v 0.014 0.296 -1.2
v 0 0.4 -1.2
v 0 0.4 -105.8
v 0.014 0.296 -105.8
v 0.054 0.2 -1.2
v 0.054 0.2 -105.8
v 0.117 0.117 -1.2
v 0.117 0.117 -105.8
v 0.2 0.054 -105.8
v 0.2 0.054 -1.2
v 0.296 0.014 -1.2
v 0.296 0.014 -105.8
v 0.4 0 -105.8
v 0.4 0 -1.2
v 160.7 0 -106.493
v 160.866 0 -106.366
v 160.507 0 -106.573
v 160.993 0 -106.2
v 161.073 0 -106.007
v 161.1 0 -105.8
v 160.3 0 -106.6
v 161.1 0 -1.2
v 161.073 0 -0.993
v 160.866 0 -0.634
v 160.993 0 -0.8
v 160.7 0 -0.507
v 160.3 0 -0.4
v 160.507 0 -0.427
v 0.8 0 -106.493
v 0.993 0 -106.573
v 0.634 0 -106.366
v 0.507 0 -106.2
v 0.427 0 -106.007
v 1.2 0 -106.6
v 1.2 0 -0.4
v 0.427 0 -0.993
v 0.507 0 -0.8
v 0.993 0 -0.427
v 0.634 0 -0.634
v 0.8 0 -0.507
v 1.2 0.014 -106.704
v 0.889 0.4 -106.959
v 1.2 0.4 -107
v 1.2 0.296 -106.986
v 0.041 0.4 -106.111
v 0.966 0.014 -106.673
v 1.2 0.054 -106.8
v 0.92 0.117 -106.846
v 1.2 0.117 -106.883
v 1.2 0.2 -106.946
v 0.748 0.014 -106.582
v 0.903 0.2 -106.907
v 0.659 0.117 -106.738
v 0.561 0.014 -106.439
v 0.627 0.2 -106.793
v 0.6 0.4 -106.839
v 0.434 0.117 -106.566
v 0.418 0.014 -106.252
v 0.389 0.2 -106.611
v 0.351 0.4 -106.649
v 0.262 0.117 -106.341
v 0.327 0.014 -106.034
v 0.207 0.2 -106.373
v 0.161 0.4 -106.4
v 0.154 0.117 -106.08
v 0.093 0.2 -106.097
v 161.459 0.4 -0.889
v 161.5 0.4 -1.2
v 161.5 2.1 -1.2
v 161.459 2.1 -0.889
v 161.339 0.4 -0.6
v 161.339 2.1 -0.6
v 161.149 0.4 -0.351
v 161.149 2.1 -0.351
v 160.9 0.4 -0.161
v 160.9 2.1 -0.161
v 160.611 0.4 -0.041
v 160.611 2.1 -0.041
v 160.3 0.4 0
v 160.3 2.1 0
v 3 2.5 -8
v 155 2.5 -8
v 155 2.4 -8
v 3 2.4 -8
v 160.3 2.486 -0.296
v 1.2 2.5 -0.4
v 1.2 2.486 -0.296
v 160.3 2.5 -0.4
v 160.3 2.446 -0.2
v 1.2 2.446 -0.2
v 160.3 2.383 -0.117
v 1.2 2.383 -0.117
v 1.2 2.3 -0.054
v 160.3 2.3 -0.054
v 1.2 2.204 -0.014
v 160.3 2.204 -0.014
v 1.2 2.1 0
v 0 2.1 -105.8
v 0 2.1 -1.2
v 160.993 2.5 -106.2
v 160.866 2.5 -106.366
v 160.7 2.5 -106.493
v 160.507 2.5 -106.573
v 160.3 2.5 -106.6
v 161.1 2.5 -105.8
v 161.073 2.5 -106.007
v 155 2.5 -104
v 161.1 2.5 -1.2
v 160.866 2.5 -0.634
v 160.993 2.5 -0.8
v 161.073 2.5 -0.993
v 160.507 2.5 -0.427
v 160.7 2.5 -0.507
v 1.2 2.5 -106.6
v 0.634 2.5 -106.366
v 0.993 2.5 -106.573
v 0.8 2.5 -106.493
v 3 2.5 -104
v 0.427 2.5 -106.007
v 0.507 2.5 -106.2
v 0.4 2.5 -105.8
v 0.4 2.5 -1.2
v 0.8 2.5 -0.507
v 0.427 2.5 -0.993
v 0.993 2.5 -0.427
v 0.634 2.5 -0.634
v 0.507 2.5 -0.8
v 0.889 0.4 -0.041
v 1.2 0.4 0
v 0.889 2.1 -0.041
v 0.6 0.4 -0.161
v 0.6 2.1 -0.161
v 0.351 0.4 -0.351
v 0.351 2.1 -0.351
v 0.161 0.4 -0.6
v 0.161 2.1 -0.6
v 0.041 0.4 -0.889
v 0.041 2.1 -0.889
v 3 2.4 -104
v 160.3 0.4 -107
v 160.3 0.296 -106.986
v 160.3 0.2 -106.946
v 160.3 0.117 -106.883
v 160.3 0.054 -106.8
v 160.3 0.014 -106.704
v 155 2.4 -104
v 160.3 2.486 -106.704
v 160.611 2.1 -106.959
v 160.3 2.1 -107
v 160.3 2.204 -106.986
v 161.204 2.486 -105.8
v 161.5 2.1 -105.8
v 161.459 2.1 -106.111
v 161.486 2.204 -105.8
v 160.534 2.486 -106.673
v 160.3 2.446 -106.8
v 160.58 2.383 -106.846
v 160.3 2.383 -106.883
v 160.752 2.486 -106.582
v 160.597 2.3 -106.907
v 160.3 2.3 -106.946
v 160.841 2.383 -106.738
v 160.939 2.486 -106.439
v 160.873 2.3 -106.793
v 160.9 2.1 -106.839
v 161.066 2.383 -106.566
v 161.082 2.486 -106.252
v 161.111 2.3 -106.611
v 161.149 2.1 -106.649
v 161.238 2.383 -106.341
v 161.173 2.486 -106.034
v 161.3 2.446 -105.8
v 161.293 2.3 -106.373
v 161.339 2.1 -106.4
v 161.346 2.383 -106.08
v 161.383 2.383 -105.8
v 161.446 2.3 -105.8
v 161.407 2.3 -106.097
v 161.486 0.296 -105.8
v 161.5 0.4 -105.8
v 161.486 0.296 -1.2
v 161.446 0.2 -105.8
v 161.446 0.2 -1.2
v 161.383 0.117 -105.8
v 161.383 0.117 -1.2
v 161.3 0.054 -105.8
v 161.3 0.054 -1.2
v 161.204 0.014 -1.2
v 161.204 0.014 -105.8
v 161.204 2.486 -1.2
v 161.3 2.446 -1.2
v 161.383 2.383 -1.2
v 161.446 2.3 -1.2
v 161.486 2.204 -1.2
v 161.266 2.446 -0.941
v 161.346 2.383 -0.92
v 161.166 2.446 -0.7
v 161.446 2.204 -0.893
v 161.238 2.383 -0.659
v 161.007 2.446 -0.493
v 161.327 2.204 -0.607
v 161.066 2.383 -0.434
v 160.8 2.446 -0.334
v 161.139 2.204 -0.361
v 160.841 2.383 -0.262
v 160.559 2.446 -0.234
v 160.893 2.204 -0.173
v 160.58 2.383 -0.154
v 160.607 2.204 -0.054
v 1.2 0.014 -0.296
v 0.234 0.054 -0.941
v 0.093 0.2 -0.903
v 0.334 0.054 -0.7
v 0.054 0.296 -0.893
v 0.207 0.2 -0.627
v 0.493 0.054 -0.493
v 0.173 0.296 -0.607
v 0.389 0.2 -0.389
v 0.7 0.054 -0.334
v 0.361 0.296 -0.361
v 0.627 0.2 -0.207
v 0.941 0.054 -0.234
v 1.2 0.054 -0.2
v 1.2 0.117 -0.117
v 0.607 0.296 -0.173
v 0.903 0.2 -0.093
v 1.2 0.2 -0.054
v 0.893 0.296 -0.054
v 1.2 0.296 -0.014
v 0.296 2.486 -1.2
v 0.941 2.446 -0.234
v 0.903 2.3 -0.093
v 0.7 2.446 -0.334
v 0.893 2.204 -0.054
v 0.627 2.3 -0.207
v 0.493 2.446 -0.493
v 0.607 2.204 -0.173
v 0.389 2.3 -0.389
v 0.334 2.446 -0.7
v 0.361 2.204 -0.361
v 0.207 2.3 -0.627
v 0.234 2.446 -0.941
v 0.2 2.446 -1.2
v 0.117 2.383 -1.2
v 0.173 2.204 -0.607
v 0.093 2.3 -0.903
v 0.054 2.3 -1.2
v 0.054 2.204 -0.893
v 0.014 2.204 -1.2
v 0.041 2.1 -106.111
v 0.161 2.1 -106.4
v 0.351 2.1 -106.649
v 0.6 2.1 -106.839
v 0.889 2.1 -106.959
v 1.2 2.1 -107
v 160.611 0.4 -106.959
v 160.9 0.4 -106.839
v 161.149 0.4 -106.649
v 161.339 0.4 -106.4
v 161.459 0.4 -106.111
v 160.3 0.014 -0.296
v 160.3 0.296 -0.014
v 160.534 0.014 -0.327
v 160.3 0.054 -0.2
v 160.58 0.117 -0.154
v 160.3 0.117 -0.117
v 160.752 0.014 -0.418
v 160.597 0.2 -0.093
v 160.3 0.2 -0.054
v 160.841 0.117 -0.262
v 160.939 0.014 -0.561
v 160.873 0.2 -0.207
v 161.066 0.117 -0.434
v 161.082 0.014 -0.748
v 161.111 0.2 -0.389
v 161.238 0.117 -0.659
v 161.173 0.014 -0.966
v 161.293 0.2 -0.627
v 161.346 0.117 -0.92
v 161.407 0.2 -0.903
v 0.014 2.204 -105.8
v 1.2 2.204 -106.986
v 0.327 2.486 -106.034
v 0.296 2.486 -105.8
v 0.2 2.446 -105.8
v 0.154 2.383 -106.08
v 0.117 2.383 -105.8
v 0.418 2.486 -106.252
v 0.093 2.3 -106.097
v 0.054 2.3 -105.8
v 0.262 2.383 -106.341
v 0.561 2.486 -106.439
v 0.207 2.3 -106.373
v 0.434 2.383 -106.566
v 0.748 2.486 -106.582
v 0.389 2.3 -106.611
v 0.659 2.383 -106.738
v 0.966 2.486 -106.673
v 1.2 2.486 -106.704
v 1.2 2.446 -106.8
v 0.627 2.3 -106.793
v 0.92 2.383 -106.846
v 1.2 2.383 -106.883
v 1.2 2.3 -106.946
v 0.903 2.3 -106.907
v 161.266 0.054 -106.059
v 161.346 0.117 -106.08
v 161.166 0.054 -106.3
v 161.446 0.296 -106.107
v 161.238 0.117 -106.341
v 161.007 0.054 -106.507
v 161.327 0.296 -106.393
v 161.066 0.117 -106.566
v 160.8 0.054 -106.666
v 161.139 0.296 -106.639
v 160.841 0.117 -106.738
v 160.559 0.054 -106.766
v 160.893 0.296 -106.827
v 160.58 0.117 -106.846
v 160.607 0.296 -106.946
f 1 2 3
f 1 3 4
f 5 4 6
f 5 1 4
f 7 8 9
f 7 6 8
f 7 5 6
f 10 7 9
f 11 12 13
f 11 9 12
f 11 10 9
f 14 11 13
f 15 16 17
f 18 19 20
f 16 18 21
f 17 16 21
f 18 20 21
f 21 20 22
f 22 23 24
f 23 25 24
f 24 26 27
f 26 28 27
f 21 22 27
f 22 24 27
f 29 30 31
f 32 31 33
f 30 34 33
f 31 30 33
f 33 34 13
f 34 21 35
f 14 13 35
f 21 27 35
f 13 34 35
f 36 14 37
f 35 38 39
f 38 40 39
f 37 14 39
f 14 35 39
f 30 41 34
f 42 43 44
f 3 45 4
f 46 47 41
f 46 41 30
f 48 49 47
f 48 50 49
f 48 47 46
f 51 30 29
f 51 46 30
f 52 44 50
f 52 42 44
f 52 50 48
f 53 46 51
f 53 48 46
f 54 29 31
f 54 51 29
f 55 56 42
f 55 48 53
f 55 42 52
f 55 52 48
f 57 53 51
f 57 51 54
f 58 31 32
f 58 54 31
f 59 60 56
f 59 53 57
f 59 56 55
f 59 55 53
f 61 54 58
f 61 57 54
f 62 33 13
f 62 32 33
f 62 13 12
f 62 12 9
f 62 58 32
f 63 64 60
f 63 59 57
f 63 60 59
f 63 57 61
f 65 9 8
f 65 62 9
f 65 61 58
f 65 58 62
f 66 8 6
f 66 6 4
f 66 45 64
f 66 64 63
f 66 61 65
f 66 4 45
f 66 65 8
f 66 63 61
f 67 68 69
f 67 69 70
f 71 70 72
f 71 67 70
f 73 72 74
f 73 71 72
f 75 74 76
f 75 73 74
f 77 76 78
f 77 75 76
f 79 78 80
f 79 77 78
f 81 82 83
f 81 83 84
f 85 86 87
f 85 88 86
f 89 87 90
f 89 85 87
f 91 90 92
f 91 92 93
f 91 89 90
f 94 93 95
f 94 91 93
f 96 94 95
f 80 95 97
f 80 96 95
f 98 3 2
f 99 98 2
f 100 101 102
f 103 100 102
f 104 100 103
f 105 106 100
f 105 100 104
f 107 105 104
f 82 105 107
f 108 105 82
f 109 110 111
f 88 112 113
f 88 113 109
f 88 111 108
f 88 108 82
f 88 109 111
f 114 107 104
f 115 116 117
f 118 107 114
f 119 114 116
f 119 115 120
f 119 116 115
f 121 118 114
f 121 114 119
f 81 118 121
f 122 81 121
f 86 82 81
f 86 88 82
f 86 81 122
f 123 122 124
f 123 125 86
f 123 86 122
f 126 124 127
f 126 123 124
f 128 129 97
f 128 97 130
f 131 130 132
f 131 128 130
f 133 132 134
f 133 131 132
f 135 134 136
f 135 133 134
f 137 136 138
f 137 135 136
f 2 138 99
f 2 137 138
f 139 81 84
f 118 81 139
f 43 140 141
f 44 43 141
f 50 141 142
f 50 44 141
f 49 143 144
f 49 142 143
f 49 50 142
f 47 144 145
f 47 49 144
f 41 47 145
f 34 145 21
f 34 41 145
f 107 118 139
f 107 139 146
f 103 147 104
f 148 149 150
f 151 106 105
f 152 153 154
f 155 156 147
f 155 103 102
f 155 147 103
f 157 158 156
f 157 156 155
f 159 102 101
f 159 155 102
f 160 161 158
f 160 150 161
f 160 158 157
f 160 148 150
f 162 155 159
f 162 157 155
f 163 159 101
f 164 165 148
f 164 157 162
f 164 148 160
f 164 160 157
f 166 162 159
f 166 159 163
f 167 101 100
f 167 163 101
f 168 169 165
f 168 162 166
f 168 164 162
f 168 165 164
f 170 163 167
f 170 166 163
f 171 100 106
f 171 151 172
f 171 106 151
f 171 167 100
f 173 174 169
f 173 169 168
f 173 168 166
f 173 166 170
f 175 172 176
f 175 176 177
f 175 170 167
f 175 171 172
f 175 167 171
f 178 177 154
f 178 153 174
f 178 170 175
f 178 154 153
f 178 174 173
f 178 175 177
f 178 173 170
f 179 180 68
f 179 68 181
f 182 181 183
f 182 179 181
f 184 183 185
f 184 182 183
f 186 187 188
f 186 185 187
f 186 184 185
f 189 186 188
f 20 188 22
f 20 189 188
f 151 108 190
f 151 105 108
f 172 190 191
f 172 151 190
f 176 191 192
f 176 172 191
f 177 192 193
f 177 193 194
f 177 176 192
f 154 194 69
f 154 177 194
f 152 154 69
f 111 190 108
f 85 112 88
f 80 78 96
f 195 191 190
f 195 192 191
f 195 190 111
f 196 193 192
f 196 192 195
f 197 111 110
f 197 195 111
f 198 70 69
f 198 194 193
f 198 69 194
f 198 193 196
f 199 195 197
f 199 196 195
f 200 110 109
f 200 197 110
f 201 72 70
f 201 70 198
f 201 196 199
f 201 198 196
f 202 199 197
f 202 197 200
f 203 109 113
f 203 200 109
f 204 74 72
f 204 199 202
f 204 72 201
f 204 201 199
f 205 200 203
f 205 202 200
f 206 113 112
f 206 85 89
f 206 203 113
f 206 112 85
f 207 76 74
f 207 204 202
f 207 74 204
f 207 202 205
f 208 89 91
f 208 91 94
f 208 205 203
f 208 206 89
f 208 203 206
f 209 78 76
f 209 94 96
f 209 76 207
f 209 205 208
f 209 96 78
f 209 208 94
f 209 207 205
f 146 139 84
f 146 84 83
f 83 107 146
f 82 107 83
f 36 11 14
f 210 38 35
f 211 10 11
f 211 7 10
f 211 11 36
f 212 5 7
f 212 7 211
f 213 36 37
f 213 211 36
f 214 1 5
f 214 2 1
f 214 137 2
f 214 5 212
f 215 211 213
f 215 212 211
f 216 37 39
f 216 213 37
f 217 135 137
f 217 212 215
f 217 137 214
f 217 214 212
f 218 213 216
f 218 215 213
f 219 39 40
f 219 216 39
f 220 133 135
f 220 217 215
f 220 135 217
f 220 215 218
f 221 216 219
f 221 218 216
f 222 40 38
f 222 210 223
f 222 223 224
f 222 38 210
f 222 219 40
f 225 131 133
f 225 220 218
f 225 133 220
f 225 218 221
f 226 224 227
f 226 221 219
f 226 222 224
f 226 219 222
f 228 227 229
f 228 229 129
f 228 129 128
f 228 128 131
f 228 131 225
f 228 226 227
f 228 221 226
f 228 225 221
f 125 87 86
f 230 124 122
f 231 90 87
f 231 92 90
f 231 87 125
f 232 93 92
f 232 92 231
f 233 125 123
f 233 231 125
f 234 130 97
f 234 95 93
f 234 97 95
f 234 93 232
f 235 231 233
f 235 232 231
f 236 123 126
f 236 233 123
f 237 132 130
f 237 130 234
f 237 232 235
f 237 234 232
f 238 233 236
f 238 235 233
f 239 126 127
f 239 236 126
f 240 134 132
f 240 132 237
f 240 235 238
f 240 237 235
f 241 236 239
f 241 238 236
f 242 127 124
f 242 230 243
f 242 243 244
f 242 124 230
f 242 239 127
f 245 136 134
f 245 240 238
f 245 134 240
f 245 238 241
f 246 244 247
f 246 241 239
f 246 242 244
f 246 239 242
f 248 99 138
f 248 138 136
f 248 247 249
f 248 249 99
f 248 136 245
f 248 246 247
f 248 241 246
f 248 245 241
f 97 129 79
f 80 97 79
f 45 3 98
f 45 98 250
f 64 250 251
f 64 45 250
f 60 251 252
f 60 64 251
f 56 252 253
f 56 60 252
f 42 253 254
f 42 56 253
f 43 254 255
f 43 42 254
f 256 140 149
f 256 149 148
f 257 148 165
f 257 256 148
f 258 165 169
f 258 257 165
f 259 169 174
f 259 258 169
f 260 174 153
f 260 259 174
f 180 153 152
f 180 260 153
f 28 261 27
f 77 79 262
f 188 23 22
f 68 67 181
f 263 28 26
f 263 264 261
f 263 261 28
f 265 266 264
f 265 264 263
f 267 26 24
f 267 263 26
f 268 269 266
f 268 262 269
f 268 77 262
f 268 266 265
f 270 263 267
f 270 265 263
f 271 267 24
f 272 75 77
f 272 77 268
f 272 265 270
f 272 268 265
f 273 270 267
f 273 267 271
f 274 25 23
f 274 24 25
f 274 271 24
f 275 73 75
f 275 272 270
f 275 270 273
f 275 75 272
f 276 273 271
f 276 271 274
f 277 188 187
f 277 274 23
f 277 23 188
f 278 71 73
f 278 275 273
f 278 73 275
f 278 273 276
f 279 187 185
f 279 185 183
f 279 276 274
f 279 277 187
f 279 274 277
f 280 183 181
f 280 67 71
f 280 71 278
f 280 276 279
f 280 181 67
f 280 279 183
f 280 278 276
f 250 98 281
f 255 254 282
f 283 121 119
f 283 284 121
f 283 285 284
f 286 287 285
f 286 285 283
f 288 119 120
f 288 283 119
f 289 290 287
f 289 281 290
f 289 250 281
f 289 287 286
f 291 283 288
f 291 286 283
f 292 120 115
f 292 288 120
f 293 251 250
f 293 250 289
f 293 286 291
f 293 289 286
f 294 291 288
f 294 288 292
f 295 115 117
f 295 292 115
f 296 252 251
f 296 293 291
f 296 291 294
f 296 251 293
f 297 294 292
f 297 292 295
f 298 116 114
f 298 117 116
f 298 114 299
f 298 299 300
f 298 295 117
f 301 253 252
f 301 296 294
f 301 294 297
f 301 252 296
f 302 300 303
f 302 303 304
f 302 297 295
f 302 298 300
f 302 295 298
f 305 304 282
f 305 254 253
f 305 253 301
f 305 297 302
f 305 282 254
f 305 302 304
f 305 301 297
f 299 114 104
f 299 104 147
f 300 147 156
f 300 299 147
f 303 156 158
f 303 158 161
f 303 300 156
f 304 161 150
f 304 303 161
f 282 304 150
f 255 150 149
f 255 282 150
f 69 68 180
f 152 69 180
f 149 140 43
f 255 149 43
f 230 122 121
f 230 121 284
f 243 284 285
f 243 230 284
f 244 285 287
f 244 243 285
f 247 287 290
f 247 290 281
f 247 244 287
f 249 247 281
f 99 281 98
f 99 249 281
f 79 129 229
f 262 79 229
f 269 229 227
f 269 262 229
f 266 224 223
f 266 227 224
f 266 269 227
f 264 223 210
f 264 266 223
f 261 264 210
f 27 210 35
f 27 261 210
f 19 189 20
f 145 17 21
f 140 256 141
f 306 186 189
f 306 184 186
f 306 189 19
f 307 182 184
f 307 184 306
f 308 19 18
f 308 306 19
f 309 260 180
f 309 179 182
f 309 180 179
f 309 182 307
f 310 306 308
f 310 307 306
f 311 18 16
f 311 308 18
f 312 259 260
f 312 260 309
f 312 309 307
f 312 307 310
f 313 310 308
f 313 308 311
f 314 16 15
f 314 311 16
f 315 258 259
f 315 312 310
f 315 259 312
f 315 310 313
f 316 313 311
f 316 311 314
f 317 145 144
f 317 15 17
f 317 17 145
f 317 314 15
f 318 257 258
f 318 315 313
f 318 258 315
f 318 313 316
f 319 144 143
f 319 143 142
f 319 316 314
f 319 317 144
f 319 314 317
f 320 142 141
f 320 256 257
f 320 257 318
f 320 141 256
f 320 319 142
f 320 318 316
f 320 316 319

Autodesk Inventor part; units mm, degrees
ref_plane "YZ Plane" through (0, 0, 0) normal (1, 0, 0) x (0, 1, 0)
ref_plane "XZ Plane" through (0, 0, 0) normal (0, 1, 0) x (-1, 0, 0)
ref_plane "XY Plane" through (0, 0, 0) normal (0, 0, 1) x (1, 0, 0)
sketch "Sketch1" plane through (0, 0, 0) normal (0, 1, 0) x (-1, 0, 0)
  line L0 (0, 0) -> (-161.5, 0)
  line L1 (-161.5, 0) -> (-161.5, -107)
  line L2 (-161.5, -107) -> (0, -107)
  line L3 (0, -107) -> (0, 0)
  dimension "d0" = 161.5
  dimension "d1" = 107
extrude "Extrusion1" add sketch "Sketch1" along normal blind 2.5
sketch "Sketch2" plane through (0, 2.5, 0) normal (0, 1, 0) x (1, 0, 0)
  line L0 (161.5, 107) -> (0, 107) projected
  line L1 (0, 107) -> (0, 0) projected
  line L2 (3, 104) -> (155, 104)
  line L3 (155, 104) -> (155, 8)
  line L4 (155, 8) -> (3, 8)
  line L5 (3, 8) -> (3, 104)
  dimension "d4" = 3
  dimension "d5" = 3
  dimension "d6" = 152
  dimension "d7" = 96
extrude "Extrusion2" cut sketch "Sketch2" against normal blind 0.1
fillet "Fillet1" radius 0.4 8 edges at (0, 2.5, -53.5) (80.75, 2.5, -107) (80.75, 2.5, 0) (161.5, 2.5, -53.5) (80.75, 0, 0) (0, 0, -53.5) (80.75, 0, -107) (161.5, 0, -53.5)
fillet "Fillet2" radius 1.2 12 edges at (161.3828, 2.3828, -0.1172) (161.3828, 0.1172, -0.1172) (161.5, 1.25, 0) (0.1172, 2.3828, -0.1172) (0.1172, 0.1172, -0.1172) (0, 1.25, 0) (0.1172, 2.3828, -106.8828) (0.1172, 0.1172, -106.8828) (0, 1.25, -107) (161.3828, 2.3828, -106.8828) (161.3828, 0.1172, -106.8828) (161.5, 1.25, -107)
properties part number "main_lcd_panel"
